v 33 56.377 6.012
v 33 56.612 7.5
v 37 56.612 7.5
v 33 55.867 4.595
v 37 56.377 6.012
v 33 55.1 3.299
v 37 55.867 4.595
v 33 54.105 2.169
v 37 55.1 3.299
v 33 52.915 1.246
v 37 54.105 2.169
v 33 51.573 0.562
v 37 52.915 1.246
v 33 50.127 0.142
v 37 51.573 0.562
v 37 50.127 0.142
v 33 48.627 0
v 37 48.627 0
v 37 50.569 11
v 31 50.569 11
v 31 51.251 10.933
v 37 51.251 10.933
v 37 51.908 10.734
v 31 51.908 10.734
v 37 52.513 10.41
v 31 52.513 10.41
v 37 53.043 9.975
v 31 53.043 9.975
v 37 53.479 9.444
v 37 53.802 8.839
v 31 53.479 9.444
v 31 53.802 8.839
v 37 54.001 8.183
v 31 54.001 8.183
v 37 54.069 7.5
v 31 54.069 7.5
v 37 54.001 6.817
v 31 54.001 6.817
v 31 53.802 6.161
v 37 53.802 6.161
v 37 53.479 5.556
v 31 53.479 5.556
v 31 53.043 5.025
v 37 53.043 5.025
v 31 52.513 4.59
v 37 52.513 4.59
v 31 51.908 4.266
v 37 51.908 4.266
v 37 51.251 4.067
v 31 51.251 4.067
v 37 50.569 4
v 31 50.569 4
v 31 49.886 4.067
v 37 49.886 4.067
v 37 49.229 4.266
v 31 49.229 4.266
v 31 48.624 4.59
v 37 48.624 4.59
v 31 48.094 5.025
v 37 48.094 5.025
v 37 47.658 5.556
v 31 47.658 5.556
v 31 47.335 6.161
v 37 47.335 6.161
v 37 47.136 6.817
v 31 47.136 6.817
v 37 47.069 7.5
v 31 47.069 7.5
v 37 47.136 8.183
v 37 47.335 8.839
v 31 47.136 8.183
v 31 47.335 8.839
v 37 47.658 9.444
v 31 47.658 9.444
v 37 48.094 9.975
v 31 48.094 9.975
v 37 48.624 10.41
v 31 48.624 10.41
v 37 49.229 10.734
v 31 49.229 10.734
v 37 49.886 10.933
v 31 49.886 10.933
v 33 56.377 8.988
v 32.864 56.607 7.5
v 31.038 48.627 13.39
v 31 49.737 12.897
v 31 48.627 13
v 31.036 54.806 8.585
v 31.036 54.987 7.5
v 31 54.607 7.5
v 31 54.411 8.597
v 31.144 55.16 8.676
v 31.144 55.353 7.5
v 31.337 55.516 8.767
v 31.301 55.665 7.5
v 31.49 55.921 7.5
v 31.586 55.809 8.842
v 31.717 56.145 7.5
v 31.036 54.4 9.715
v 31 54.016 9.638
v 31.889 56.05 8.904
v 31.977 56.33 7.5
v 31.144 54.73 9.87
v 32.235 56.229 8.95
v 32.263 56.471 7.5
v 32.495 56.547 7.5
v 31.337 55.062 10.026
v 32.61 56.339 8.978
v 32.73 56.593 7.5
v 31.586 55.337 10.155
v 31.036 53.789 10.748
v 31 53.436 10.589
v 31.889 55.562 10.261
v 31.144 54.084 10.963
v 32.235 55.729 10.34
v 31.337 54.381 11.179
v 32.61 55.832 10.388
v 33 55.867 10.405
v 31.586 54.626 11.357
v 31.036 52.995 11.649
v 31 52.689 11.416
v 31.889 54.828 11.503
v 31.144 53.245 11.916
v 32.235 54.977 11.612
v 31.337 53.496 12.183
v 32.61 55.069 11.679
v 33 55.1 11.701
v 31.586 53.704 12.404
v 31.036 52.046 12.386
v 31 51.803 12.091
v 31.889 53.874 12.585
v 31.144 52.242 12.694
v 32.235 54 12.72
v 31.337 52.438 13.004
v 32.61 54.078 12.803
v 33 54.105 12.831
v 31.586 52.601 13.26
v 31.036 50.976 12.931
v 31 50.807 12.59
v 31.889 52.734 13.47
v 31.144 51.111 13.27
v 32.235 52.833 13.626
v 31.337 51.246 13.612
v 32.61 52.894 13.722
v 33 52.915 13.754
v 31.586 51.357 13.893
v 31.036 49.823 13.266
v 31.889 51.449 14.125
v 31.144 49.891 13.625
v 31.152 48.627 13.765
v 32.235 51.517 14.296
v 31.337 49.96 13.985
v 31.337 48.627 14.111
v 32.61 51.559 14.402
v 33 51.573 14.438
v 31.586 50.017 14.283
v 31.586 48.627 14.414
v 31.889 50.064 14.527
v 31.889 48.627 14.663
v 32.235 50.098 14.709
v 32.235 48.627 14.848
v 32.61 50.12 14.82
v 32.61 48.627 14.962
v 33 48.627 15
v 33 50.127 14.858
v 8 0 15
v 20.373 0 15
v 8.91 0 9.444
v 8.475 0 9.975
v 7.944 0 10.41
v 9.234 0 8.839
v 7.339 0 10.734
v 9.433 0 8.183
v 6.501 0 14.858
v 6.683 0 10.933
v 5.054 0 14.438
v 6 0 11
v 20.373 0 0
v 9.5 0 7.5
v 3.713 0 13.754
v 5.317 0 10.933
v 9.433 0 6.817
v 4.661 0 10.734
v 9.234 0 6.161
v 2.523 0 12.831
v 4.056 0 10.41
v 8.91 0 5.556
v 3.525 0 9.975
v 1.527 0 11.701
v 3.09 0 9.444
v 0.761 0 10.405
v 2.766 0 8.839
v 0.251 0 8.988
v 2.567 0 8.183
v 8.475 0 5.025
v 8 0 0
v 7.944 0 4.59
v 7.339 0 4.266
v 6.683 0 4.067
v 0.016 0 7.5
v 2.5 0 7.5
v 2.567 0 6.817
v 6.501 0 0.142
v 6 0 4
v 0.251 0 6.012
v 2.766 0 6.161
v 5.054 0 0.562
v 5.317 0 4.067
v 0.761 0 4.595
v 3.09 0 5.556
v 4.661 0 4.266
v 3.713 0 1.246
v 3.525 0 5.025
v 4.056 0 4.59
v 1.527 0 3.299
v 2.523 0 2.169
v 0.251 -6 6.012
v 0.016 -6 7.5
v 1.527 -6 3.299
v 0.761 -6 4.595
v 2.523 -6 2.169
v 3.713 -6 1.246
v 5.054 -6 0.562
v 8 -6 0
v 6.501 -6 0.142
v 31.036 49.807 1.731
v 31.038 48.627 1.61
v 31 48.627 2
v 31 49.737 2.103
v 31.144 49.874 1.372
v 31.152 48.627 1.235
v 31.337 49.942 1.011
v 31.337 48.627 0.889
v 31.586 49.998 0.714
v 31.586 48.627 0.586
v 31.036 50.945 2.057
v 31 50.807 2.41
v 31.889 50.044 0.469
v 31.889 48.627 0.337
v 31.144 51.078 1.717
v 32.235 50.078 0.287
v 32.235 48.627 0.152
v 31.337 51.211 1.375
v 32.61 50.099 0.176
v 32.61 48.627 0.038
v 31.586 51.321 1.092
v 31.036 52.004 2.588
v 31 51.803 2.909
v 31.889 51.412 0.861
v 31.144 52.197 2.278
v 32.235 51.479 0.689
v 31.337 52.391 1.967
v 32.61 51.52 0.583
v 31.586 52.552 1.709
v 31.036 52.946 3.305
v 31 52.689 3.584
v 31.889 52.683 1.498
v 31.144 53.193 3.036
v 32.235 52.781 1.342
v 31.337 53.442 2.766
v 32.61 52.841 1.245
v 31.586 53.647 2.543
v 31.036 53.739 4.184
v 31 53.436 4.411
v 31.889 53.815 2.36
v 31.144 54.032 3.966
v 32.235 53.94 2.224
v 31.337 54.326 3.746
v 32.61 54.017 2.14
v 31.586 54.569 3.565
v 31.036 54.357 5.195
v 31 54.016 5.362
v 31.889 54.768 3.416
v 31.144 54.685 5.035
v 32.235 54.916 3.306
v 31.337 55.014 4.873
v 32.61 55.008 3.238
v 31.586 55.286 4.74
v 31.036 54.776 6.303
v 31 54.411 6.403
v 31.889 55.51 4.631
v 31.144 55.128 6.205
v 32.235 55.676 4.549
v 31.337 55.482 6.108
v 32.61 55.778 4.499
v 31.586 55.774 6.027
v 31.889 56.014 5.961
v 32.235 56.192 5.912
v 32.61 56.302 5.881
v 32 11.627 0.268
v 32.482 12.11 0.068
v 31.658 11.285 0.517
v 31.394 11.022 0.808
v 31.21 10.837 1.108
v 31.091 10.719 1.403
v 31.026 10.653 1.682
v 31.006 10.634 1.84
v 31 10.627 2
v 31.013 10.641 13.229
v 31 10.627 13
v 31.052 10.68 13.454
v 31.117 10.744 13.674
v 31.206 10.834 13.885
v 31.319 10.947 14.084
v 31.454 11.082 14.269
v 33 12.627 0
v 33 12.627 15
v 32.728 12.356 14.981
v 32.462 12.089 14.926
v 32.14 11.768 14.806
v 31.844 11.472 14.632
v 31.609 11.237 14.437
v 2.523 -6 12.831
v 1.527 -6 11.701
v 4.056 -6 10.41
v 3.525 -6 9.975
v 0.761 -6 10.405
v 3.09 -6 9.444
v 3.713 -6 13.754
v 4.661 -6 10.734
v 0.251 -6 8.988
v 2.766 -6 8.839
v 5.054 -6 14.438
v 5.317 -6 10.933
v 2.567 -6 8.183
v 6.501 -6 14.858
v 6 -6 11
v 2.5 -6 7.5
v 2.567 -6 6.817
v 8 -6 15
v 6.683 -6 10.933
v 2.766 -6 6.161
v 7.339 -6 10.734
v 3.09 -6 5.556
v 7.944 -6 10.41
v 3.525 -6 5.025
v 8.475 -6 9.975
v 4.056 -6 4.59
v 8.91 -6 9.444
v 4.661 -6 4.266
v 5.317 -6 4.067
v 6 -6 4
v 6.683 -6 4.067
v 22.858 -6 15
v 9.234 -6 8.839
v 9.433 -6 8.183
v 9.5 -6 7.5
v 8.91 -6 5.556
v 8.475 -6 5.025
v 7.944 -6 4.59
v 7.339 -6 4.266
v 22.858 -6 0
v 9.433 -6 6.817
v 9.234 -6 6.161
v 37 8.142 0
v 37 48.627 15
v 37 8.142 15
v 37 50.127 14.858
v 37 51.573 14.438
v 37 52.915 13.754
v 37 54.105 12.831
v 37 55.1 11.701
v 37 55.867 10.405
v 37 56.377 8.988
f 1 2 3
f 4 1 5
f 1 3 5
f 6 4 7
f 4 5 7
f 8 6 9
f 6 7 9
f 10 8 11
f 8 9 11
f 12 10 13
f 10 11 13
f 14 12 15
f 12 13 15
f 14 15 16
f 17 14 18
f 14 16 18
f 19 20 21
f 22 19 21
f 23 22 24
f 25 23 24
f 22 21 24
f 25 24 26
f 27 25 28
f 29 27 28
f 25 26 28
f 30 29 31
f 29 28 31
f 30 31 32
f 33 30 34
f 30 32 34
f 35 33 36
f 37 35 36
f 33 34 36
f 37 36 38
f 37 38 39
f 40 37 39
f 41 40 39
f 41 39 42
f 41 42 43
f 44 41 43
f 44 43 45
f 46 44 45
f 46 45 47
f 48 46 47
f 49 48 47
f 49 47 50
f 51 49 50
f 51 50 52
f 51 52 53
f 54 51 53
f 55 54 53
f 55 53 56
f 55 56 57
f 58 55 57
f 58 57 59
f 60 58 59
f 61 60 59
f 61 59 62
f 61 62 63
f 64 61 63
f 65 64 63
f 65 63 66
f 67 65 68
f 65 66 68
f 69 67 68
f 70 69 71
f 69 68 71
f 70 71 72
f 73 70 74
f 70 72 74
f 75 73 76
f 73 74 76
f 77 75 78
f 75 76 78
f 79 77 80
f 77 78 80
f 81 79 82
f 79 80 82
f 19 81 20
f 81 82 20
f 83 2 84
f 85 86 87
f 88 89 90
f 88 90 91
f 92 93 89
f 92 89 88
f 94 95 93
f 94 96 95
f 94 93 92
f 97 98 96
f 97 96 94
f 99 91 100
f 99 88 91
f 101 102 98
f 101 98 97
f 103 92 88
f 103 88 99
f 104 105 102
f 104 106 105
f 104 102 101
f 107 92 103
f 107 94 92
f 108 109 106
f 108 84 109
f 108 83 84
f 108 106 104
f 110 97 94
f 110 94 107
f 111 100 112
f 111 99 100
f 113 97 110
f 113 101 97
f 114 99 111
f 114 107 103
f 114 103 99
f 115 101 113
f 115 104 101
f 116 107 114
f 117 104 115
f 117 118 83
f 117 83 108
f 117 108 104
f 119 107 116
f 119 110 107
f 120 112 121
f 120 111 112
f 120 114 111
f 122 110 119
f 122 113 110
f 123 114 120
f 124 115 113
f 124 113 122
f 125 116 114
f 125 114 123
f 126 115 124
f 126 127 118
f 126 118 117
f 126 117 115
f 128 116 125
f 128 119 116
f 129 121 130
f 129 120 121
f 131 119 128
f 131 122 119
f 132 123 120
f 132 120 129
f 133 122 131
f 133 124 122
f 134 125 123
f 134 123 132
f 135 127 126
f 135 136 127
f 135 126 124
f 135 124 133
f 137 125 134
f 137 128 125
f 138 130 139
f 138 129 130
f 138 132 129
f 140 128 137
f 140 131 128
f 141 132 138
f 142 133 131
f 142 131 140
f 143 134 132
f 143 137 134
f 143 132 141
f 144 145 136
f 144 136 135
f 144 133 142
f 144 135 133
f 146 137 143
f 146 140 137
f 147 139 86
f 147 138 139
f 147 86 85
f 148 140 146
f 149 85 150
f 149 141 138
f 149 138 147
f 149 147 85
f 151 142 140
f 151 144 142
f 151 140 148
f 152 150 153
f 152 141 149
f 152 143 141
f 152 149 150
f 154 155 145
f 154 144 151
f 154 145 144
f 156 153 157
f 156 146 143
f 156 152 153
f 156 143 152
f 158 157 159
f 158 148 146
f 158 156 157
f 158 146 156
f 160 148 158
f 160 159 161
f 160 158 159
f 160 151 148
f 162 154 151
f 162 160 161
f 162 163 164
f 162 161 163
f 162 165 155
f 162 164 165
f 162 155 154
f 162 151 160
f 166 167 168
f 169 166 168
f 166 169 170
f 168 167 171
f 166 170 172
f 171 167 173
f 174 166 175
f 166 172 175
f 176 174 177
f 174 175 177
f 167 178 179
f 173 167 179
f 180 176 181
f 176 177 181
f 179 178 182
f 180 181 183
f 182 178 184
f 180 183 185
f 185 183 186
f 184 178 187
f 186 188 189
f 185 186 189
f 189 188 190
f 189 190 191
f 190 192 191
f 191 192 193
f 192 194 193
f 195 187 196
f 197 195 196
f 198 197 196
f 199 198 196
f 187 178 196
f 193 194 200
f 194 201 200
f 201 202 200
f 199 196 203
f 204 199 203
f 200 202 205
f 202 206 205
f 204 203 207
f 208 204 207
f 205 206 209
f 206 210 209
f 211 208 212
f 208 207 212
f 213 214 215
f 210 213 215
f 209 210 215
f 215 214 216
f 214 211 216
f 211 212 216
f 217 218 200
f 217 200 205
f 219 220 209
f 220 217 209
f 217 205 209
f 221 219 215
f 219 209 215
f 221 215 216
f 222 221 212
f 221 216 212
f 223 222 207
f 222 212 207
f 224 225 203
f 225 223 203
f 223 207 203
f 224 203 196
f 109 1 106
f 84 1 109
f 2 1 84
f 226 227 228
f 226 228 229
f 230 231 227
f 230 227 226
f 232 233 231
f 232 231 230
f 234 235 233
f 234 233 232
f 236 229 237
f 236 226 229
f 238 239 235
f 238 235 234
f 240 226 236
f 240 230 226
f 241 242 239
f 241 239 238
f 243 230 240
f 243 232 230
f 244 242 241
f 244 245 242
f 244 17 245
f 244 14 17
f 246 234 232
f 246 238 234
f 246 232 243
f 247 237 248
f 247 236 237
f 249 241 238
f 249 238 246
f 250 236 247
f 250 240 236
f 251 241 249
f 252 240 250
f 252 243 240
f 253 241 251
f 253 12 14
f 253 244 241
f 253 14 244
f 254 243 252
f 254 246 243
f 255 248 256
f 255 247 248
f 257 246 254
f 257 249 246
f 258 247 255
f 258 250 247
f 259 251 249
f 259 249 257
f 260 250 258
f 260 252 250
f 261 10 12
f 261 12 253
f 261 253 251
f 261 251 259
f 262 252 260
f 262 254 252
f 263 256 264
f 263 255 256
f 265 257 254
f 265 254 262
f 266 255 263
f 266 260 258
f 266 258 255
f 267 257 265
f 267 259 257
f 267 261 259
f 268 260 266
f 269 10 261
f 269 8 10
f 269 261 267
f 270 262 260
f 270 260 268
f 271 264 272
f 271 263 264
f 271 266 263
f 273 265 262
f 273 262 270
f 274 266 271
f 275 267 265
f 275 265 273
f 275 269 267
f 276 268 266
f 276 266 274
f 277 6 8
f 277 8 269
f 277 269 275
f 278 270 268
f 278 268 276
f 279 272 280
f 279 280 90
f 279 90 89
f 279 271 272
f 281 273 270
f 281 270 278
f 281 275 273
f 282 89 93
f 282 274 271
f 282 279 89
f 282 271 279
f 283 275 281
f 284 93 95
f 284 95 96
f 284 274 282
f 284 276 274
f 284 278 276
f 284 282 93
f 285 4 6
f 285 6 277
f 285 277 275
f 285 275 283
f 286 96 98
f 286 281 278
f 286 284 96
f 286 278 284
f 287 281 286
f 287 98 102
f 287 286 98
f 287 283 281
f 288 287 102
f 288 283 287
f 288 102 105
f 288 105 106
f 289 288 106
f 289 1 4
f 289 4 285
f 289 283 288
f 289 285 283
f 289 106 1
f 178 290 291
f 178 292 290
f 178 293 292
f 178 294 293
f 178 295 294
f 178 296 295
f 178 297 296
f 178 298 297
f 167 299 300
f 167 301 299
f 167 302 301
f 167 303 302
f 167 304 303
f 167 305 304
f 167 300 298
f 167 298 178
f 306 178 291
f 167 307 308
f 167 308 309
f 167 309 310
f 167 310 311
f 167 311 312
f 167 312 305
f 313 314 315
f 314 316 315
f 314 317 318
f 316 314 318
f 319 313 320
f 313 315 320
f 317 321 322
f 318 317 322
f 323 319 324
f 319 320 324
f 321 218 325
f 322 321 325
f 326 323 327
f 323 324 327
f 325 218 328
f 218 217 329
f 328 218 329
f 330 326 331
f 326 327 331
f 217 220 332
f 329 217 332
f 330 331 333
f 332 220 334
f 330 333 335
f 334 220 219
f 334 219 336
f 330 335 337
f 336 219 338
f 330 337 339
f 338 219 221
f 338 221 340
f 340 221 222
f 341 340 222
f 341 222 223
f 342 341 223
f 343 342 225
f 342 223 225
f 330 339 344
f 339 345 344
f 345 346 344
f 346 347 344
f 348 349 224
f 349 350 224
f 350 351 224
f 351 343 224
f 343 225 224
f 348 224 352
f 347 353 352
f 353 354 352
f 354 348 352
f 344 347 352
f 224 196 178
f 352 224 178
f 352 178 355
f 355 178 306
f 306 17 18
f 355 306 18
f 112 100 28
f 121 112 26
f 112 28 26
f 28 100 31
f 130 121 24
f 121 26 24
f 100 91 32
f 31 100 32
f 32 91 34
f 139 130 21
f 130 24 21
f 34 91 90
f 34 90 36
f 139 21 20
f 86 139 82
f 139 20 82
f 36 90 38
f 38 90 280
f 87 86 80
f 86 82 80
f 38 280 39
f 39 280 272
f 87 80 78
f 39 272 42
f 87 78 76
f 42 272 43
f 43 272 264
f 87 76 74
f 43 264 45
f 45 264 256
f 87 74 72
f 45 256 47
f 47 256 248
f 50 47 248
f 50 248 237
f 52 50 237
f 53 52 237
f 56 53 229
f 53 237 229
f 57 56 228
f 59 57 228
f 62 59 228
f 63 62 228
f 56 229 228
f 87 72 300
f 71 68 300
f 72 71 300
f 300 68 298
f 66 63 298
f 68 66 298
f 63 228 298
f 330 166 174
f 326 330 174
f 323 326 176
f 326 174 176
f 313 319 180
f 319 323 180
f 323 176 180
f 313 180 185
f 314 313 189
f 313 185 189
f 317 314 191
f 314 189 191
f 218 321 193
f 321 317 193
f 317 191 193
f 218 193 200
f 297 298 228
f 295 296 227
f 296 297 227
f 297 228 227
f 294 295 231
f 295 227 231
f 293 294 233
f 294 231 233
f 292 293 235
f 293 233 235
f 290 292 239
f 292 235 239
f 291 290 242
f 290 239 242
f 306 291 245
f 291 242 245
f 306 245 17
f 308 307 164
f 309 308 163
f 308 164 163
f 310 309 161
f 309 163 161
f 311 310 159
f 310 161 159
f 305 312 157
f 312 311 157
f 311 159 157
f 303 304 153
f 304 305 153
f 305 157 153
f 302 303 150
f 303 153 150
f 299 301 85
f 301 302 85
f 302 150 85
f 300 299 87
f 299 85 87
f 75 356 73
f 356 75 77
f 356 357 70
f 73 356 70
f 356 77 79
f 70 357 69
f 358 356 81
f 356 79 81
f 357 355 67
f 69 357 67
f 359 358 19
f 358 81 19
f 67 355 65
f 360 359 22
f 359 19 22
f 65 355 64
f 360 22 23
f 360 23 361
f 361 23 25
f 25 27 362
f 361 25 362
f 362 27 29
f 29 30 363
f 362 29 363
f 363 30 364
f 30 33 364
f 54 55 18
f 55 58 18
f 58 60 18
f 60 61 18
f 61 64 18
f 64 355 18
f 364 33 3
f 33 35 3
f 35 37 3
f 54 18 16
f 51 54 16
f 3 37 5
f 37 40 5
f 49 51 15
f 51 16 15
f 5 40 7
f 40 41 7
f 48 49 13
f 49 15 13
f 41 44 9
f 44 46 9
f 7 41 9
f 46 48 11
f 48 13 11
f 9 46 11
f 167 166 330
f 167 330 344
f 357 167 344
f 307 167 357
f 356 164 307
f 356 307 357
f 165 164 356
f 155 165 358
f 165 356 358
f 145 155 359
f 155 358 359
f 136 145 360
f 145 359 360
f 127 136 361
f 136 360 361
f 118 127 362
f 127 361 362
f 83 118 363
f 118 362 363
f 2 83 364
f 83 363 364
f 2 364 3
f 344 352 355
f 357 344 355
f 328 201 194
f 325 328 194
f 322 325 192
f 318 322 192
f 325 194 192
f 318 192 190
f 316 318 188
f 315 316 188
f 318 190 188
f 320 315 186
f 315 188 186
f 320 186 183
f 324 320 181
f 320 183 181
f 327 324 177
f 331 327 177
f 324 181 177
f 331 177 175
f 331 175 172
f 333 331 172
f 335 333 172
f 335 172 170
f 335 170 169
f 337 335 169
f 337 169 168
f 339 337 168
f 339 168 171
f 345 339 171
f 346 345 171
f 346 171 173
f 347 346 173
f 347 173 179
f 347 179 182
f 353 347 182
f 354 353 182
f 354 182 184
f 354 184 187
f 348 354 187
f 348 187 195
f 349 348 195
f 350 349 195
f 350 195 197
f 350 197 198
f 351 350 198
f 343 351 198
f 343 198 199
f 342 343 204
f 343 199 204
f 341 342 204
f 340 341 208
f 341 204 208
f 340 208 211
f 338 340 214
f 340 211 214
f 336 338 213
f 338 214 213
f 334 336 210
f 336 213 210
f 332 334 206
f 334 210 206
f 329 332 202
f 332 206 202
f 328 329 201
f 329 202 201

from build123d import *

# Parameters (mm, degrees)
EXTRUDE_1_DEPTH     = 15
SKETCH_3_R          = 3.5
CUT_EXTRUDE_1_DEPTH = 70.286826712
SKETCH_4_R          = 3.5
CUT_EXTRUDE_2_DEPTH = 67.277178243
FILLET_1_R          = 8
FILLET_4_R          = 2


with BuildPart() as part:
    # 草图1 → 凸台-拉伸1 (new body)
    with BuildSketch(Plane.XY):
        Polygon((0, 0), (0, -6), (22.857864376, -6), (37, 8.142135624), (37, 56.627416998), (31, 56.627416998), (31, 10.627416998), (20.372583002, 0), align=None)
    extrude(amount=EXTRUDE_1_DEPTH)

    # 草图3 → 切除-拉伸1 (cut, through all)
    with BuildSketch(Plane(origin=(0, 0, 0), x_dir=(1, 0, 0), z_dir=(0, 1, 0))):
        with Locations(Location((6, -7.5, 0), (0, 0, 180))):
            Circle(SKETCH_3_R)
    extrude(amount=-CUT_EXTRUDE_1_DEPTH, mode=Mode.SUBTRACT)

    # 草图4 → 切除-拉伸2 (cut, through all)
    with BuildSketch(Plane.ZY.offset(-31)):
        with Locations((7.5, 50.568542495)):
            Circle(SKETCH_4_R)
    extrude(amount=-CUT_EXTRUDE_2_DEPTH, mode=Mode.SUBTRACT)

    # 圆角1
    # the kernel refuses this fillet: 8 mm, written as the material it takes off along each edge
    with BuildSketch(Plane(origin=(0, 20, 15), x_dir=(0, 0, -1), z_dir=(0, -1, 0)), Plane(origin=(57, 56.627416998, 0), x_dir=(0, -1, 0), z_dir=(-1, 0, 0))) as fillet_1_piece_1:
        with BuildLine():
            CenterArc((FILLET_1_R, FILLET_1_R), FILLET_1_R, 180, 90)
            Line((0, FILLET_1_R), (0, 0))
            Line((0, 0), (FILLET_1_R, 0))
        make_face()
    extrude(amount=46, mode=Mode.SUBTRACT)
    with BuildSketch(Plane(origin=(0, 20, 0), x_dir=(0, 0, 1), z_dir=(0, -1, 0)), Plane(origin=(57, 56.627416998, 15), x_dir=(0, -1, 0), z_dir=(-1, 0, 0))) as fillet_1_piece_2:
        with BuildLine():
            CenterArc((FILLET_1_R, -FILLET_1_R), FILLET_1_R, 90, 90)
            Line((0, -FILLET_1_R), (0, 0))
            Line((0, 0), (FILLET_1_R, 0))
        make_face()
    extrude(amount=46, mode=Mode.SUBTRACT)

    # 圆角4
    # the kernel refuses this fillet: 2 mm, written as the material it takes off along each edge
    with BuildSketch(Plane(origin=(31, 48.627416998, 15), x_dir=(0, 0, -1), z_dir=(0, -1, 0))) as fillet_4_piece_1_section:
        with BuildLine():
            CenterArc((FILLET_4_R, FILLET_4_R), FILLET_4_R, 180, 90)
            Line((0, FILLET_4_R), (0, 0))
            Line((0, 0), (FILLET_4_R, 0))
        make_face()
    fillet_4_piece_1 = extrude(amount=43, mode=Mode.PRIVATE)
    fillet_4_piece_1 = split(fillet_4_piece_1, bisect_by=Plane(origin=(40.835879215, 20.463296213, 14.544284738), z_dir=(-0.7071067811865489, 0.7071067811865461, 0)), keep=Keep.TOP, mode=Mode.PRIVATE)
    add(fillet_4_piece_1, mode=Mode.SUBTRACT)
    with BuildSketch(Plane(origin=(31, 48.627416998, 0), x_dir=(1, 0, 0), z_dir=(0, -1, 0))) as fillet_4_piece_2_section:
        with BuildLine():
            CenterArc((FILLET_4_R, FILLET_4_R), FILLET_4_R, 180, 90)
            Line((0, FILLET_4_R), (0, 0))
            Line((0, 0), (FILLET_4_R, 0))
        make_face()
    fillet_4_piece_2 = extrude(amount=43, mode=Mode.PRIVATE)
    fillet_4_piece_2 = split(fillet_4_piece_2, bisect_by=Plane(origin=(40.835879215, 20.463296213, 0.455715262), z_dir=(-0.7071067811865489, 0.7071067811865461, 0)), keep=Keep.TOP, mode=Mode.PRIVATE)
    add(fillet_4_piece_2, mode=Mode.SUBTRACT)
    with BuildSketch(Plane(origin=(31, 48.627416998, 7), x_dir=(0, 0.8458227796369704, -0.5334639870199197), z_dir=(0, -0.5334639870199197, -0.8458227796369704))) as fillet_4_piece_3:
        with BuildLine():
            CenterArc((8 - FILLET_4_R, FILLET_4_R), FILLET_4_R, 270, 90)
            Line((8, FILLET_4_R), (8, 0))
            Line((8, 0), (8 - FILLET_4_R, 0))
        make_face()
    revolve(axis=Axis((31, 48.627416998, 7), (1, 0, 0)), revolution_arc=122.239802646, mode=Mode.SUBTRACT)
    with BuildSketch(Plane(origin=(31, 48.627416998, 8), x_dir=(0, 0, -1), z_dir=(0, -1, 0))) as fillet_4_piece_4:
        with BuildLine():
            CenterArc((8 - FILLET_4_R, FILLET_4_R), FILLET_4_R, 270, 90)
            Line((8, FILLET_4_R), (8, 0))
            Line((8, 0), (8 - FILLET_4_R, 0))
        make_face()
    revolve(axis=Axis((31, 48.627416998, 8), (1, 0, 0)), revolution_arc=122.239802646, mode=Mode.SUBTRACT)


solid = part.part
